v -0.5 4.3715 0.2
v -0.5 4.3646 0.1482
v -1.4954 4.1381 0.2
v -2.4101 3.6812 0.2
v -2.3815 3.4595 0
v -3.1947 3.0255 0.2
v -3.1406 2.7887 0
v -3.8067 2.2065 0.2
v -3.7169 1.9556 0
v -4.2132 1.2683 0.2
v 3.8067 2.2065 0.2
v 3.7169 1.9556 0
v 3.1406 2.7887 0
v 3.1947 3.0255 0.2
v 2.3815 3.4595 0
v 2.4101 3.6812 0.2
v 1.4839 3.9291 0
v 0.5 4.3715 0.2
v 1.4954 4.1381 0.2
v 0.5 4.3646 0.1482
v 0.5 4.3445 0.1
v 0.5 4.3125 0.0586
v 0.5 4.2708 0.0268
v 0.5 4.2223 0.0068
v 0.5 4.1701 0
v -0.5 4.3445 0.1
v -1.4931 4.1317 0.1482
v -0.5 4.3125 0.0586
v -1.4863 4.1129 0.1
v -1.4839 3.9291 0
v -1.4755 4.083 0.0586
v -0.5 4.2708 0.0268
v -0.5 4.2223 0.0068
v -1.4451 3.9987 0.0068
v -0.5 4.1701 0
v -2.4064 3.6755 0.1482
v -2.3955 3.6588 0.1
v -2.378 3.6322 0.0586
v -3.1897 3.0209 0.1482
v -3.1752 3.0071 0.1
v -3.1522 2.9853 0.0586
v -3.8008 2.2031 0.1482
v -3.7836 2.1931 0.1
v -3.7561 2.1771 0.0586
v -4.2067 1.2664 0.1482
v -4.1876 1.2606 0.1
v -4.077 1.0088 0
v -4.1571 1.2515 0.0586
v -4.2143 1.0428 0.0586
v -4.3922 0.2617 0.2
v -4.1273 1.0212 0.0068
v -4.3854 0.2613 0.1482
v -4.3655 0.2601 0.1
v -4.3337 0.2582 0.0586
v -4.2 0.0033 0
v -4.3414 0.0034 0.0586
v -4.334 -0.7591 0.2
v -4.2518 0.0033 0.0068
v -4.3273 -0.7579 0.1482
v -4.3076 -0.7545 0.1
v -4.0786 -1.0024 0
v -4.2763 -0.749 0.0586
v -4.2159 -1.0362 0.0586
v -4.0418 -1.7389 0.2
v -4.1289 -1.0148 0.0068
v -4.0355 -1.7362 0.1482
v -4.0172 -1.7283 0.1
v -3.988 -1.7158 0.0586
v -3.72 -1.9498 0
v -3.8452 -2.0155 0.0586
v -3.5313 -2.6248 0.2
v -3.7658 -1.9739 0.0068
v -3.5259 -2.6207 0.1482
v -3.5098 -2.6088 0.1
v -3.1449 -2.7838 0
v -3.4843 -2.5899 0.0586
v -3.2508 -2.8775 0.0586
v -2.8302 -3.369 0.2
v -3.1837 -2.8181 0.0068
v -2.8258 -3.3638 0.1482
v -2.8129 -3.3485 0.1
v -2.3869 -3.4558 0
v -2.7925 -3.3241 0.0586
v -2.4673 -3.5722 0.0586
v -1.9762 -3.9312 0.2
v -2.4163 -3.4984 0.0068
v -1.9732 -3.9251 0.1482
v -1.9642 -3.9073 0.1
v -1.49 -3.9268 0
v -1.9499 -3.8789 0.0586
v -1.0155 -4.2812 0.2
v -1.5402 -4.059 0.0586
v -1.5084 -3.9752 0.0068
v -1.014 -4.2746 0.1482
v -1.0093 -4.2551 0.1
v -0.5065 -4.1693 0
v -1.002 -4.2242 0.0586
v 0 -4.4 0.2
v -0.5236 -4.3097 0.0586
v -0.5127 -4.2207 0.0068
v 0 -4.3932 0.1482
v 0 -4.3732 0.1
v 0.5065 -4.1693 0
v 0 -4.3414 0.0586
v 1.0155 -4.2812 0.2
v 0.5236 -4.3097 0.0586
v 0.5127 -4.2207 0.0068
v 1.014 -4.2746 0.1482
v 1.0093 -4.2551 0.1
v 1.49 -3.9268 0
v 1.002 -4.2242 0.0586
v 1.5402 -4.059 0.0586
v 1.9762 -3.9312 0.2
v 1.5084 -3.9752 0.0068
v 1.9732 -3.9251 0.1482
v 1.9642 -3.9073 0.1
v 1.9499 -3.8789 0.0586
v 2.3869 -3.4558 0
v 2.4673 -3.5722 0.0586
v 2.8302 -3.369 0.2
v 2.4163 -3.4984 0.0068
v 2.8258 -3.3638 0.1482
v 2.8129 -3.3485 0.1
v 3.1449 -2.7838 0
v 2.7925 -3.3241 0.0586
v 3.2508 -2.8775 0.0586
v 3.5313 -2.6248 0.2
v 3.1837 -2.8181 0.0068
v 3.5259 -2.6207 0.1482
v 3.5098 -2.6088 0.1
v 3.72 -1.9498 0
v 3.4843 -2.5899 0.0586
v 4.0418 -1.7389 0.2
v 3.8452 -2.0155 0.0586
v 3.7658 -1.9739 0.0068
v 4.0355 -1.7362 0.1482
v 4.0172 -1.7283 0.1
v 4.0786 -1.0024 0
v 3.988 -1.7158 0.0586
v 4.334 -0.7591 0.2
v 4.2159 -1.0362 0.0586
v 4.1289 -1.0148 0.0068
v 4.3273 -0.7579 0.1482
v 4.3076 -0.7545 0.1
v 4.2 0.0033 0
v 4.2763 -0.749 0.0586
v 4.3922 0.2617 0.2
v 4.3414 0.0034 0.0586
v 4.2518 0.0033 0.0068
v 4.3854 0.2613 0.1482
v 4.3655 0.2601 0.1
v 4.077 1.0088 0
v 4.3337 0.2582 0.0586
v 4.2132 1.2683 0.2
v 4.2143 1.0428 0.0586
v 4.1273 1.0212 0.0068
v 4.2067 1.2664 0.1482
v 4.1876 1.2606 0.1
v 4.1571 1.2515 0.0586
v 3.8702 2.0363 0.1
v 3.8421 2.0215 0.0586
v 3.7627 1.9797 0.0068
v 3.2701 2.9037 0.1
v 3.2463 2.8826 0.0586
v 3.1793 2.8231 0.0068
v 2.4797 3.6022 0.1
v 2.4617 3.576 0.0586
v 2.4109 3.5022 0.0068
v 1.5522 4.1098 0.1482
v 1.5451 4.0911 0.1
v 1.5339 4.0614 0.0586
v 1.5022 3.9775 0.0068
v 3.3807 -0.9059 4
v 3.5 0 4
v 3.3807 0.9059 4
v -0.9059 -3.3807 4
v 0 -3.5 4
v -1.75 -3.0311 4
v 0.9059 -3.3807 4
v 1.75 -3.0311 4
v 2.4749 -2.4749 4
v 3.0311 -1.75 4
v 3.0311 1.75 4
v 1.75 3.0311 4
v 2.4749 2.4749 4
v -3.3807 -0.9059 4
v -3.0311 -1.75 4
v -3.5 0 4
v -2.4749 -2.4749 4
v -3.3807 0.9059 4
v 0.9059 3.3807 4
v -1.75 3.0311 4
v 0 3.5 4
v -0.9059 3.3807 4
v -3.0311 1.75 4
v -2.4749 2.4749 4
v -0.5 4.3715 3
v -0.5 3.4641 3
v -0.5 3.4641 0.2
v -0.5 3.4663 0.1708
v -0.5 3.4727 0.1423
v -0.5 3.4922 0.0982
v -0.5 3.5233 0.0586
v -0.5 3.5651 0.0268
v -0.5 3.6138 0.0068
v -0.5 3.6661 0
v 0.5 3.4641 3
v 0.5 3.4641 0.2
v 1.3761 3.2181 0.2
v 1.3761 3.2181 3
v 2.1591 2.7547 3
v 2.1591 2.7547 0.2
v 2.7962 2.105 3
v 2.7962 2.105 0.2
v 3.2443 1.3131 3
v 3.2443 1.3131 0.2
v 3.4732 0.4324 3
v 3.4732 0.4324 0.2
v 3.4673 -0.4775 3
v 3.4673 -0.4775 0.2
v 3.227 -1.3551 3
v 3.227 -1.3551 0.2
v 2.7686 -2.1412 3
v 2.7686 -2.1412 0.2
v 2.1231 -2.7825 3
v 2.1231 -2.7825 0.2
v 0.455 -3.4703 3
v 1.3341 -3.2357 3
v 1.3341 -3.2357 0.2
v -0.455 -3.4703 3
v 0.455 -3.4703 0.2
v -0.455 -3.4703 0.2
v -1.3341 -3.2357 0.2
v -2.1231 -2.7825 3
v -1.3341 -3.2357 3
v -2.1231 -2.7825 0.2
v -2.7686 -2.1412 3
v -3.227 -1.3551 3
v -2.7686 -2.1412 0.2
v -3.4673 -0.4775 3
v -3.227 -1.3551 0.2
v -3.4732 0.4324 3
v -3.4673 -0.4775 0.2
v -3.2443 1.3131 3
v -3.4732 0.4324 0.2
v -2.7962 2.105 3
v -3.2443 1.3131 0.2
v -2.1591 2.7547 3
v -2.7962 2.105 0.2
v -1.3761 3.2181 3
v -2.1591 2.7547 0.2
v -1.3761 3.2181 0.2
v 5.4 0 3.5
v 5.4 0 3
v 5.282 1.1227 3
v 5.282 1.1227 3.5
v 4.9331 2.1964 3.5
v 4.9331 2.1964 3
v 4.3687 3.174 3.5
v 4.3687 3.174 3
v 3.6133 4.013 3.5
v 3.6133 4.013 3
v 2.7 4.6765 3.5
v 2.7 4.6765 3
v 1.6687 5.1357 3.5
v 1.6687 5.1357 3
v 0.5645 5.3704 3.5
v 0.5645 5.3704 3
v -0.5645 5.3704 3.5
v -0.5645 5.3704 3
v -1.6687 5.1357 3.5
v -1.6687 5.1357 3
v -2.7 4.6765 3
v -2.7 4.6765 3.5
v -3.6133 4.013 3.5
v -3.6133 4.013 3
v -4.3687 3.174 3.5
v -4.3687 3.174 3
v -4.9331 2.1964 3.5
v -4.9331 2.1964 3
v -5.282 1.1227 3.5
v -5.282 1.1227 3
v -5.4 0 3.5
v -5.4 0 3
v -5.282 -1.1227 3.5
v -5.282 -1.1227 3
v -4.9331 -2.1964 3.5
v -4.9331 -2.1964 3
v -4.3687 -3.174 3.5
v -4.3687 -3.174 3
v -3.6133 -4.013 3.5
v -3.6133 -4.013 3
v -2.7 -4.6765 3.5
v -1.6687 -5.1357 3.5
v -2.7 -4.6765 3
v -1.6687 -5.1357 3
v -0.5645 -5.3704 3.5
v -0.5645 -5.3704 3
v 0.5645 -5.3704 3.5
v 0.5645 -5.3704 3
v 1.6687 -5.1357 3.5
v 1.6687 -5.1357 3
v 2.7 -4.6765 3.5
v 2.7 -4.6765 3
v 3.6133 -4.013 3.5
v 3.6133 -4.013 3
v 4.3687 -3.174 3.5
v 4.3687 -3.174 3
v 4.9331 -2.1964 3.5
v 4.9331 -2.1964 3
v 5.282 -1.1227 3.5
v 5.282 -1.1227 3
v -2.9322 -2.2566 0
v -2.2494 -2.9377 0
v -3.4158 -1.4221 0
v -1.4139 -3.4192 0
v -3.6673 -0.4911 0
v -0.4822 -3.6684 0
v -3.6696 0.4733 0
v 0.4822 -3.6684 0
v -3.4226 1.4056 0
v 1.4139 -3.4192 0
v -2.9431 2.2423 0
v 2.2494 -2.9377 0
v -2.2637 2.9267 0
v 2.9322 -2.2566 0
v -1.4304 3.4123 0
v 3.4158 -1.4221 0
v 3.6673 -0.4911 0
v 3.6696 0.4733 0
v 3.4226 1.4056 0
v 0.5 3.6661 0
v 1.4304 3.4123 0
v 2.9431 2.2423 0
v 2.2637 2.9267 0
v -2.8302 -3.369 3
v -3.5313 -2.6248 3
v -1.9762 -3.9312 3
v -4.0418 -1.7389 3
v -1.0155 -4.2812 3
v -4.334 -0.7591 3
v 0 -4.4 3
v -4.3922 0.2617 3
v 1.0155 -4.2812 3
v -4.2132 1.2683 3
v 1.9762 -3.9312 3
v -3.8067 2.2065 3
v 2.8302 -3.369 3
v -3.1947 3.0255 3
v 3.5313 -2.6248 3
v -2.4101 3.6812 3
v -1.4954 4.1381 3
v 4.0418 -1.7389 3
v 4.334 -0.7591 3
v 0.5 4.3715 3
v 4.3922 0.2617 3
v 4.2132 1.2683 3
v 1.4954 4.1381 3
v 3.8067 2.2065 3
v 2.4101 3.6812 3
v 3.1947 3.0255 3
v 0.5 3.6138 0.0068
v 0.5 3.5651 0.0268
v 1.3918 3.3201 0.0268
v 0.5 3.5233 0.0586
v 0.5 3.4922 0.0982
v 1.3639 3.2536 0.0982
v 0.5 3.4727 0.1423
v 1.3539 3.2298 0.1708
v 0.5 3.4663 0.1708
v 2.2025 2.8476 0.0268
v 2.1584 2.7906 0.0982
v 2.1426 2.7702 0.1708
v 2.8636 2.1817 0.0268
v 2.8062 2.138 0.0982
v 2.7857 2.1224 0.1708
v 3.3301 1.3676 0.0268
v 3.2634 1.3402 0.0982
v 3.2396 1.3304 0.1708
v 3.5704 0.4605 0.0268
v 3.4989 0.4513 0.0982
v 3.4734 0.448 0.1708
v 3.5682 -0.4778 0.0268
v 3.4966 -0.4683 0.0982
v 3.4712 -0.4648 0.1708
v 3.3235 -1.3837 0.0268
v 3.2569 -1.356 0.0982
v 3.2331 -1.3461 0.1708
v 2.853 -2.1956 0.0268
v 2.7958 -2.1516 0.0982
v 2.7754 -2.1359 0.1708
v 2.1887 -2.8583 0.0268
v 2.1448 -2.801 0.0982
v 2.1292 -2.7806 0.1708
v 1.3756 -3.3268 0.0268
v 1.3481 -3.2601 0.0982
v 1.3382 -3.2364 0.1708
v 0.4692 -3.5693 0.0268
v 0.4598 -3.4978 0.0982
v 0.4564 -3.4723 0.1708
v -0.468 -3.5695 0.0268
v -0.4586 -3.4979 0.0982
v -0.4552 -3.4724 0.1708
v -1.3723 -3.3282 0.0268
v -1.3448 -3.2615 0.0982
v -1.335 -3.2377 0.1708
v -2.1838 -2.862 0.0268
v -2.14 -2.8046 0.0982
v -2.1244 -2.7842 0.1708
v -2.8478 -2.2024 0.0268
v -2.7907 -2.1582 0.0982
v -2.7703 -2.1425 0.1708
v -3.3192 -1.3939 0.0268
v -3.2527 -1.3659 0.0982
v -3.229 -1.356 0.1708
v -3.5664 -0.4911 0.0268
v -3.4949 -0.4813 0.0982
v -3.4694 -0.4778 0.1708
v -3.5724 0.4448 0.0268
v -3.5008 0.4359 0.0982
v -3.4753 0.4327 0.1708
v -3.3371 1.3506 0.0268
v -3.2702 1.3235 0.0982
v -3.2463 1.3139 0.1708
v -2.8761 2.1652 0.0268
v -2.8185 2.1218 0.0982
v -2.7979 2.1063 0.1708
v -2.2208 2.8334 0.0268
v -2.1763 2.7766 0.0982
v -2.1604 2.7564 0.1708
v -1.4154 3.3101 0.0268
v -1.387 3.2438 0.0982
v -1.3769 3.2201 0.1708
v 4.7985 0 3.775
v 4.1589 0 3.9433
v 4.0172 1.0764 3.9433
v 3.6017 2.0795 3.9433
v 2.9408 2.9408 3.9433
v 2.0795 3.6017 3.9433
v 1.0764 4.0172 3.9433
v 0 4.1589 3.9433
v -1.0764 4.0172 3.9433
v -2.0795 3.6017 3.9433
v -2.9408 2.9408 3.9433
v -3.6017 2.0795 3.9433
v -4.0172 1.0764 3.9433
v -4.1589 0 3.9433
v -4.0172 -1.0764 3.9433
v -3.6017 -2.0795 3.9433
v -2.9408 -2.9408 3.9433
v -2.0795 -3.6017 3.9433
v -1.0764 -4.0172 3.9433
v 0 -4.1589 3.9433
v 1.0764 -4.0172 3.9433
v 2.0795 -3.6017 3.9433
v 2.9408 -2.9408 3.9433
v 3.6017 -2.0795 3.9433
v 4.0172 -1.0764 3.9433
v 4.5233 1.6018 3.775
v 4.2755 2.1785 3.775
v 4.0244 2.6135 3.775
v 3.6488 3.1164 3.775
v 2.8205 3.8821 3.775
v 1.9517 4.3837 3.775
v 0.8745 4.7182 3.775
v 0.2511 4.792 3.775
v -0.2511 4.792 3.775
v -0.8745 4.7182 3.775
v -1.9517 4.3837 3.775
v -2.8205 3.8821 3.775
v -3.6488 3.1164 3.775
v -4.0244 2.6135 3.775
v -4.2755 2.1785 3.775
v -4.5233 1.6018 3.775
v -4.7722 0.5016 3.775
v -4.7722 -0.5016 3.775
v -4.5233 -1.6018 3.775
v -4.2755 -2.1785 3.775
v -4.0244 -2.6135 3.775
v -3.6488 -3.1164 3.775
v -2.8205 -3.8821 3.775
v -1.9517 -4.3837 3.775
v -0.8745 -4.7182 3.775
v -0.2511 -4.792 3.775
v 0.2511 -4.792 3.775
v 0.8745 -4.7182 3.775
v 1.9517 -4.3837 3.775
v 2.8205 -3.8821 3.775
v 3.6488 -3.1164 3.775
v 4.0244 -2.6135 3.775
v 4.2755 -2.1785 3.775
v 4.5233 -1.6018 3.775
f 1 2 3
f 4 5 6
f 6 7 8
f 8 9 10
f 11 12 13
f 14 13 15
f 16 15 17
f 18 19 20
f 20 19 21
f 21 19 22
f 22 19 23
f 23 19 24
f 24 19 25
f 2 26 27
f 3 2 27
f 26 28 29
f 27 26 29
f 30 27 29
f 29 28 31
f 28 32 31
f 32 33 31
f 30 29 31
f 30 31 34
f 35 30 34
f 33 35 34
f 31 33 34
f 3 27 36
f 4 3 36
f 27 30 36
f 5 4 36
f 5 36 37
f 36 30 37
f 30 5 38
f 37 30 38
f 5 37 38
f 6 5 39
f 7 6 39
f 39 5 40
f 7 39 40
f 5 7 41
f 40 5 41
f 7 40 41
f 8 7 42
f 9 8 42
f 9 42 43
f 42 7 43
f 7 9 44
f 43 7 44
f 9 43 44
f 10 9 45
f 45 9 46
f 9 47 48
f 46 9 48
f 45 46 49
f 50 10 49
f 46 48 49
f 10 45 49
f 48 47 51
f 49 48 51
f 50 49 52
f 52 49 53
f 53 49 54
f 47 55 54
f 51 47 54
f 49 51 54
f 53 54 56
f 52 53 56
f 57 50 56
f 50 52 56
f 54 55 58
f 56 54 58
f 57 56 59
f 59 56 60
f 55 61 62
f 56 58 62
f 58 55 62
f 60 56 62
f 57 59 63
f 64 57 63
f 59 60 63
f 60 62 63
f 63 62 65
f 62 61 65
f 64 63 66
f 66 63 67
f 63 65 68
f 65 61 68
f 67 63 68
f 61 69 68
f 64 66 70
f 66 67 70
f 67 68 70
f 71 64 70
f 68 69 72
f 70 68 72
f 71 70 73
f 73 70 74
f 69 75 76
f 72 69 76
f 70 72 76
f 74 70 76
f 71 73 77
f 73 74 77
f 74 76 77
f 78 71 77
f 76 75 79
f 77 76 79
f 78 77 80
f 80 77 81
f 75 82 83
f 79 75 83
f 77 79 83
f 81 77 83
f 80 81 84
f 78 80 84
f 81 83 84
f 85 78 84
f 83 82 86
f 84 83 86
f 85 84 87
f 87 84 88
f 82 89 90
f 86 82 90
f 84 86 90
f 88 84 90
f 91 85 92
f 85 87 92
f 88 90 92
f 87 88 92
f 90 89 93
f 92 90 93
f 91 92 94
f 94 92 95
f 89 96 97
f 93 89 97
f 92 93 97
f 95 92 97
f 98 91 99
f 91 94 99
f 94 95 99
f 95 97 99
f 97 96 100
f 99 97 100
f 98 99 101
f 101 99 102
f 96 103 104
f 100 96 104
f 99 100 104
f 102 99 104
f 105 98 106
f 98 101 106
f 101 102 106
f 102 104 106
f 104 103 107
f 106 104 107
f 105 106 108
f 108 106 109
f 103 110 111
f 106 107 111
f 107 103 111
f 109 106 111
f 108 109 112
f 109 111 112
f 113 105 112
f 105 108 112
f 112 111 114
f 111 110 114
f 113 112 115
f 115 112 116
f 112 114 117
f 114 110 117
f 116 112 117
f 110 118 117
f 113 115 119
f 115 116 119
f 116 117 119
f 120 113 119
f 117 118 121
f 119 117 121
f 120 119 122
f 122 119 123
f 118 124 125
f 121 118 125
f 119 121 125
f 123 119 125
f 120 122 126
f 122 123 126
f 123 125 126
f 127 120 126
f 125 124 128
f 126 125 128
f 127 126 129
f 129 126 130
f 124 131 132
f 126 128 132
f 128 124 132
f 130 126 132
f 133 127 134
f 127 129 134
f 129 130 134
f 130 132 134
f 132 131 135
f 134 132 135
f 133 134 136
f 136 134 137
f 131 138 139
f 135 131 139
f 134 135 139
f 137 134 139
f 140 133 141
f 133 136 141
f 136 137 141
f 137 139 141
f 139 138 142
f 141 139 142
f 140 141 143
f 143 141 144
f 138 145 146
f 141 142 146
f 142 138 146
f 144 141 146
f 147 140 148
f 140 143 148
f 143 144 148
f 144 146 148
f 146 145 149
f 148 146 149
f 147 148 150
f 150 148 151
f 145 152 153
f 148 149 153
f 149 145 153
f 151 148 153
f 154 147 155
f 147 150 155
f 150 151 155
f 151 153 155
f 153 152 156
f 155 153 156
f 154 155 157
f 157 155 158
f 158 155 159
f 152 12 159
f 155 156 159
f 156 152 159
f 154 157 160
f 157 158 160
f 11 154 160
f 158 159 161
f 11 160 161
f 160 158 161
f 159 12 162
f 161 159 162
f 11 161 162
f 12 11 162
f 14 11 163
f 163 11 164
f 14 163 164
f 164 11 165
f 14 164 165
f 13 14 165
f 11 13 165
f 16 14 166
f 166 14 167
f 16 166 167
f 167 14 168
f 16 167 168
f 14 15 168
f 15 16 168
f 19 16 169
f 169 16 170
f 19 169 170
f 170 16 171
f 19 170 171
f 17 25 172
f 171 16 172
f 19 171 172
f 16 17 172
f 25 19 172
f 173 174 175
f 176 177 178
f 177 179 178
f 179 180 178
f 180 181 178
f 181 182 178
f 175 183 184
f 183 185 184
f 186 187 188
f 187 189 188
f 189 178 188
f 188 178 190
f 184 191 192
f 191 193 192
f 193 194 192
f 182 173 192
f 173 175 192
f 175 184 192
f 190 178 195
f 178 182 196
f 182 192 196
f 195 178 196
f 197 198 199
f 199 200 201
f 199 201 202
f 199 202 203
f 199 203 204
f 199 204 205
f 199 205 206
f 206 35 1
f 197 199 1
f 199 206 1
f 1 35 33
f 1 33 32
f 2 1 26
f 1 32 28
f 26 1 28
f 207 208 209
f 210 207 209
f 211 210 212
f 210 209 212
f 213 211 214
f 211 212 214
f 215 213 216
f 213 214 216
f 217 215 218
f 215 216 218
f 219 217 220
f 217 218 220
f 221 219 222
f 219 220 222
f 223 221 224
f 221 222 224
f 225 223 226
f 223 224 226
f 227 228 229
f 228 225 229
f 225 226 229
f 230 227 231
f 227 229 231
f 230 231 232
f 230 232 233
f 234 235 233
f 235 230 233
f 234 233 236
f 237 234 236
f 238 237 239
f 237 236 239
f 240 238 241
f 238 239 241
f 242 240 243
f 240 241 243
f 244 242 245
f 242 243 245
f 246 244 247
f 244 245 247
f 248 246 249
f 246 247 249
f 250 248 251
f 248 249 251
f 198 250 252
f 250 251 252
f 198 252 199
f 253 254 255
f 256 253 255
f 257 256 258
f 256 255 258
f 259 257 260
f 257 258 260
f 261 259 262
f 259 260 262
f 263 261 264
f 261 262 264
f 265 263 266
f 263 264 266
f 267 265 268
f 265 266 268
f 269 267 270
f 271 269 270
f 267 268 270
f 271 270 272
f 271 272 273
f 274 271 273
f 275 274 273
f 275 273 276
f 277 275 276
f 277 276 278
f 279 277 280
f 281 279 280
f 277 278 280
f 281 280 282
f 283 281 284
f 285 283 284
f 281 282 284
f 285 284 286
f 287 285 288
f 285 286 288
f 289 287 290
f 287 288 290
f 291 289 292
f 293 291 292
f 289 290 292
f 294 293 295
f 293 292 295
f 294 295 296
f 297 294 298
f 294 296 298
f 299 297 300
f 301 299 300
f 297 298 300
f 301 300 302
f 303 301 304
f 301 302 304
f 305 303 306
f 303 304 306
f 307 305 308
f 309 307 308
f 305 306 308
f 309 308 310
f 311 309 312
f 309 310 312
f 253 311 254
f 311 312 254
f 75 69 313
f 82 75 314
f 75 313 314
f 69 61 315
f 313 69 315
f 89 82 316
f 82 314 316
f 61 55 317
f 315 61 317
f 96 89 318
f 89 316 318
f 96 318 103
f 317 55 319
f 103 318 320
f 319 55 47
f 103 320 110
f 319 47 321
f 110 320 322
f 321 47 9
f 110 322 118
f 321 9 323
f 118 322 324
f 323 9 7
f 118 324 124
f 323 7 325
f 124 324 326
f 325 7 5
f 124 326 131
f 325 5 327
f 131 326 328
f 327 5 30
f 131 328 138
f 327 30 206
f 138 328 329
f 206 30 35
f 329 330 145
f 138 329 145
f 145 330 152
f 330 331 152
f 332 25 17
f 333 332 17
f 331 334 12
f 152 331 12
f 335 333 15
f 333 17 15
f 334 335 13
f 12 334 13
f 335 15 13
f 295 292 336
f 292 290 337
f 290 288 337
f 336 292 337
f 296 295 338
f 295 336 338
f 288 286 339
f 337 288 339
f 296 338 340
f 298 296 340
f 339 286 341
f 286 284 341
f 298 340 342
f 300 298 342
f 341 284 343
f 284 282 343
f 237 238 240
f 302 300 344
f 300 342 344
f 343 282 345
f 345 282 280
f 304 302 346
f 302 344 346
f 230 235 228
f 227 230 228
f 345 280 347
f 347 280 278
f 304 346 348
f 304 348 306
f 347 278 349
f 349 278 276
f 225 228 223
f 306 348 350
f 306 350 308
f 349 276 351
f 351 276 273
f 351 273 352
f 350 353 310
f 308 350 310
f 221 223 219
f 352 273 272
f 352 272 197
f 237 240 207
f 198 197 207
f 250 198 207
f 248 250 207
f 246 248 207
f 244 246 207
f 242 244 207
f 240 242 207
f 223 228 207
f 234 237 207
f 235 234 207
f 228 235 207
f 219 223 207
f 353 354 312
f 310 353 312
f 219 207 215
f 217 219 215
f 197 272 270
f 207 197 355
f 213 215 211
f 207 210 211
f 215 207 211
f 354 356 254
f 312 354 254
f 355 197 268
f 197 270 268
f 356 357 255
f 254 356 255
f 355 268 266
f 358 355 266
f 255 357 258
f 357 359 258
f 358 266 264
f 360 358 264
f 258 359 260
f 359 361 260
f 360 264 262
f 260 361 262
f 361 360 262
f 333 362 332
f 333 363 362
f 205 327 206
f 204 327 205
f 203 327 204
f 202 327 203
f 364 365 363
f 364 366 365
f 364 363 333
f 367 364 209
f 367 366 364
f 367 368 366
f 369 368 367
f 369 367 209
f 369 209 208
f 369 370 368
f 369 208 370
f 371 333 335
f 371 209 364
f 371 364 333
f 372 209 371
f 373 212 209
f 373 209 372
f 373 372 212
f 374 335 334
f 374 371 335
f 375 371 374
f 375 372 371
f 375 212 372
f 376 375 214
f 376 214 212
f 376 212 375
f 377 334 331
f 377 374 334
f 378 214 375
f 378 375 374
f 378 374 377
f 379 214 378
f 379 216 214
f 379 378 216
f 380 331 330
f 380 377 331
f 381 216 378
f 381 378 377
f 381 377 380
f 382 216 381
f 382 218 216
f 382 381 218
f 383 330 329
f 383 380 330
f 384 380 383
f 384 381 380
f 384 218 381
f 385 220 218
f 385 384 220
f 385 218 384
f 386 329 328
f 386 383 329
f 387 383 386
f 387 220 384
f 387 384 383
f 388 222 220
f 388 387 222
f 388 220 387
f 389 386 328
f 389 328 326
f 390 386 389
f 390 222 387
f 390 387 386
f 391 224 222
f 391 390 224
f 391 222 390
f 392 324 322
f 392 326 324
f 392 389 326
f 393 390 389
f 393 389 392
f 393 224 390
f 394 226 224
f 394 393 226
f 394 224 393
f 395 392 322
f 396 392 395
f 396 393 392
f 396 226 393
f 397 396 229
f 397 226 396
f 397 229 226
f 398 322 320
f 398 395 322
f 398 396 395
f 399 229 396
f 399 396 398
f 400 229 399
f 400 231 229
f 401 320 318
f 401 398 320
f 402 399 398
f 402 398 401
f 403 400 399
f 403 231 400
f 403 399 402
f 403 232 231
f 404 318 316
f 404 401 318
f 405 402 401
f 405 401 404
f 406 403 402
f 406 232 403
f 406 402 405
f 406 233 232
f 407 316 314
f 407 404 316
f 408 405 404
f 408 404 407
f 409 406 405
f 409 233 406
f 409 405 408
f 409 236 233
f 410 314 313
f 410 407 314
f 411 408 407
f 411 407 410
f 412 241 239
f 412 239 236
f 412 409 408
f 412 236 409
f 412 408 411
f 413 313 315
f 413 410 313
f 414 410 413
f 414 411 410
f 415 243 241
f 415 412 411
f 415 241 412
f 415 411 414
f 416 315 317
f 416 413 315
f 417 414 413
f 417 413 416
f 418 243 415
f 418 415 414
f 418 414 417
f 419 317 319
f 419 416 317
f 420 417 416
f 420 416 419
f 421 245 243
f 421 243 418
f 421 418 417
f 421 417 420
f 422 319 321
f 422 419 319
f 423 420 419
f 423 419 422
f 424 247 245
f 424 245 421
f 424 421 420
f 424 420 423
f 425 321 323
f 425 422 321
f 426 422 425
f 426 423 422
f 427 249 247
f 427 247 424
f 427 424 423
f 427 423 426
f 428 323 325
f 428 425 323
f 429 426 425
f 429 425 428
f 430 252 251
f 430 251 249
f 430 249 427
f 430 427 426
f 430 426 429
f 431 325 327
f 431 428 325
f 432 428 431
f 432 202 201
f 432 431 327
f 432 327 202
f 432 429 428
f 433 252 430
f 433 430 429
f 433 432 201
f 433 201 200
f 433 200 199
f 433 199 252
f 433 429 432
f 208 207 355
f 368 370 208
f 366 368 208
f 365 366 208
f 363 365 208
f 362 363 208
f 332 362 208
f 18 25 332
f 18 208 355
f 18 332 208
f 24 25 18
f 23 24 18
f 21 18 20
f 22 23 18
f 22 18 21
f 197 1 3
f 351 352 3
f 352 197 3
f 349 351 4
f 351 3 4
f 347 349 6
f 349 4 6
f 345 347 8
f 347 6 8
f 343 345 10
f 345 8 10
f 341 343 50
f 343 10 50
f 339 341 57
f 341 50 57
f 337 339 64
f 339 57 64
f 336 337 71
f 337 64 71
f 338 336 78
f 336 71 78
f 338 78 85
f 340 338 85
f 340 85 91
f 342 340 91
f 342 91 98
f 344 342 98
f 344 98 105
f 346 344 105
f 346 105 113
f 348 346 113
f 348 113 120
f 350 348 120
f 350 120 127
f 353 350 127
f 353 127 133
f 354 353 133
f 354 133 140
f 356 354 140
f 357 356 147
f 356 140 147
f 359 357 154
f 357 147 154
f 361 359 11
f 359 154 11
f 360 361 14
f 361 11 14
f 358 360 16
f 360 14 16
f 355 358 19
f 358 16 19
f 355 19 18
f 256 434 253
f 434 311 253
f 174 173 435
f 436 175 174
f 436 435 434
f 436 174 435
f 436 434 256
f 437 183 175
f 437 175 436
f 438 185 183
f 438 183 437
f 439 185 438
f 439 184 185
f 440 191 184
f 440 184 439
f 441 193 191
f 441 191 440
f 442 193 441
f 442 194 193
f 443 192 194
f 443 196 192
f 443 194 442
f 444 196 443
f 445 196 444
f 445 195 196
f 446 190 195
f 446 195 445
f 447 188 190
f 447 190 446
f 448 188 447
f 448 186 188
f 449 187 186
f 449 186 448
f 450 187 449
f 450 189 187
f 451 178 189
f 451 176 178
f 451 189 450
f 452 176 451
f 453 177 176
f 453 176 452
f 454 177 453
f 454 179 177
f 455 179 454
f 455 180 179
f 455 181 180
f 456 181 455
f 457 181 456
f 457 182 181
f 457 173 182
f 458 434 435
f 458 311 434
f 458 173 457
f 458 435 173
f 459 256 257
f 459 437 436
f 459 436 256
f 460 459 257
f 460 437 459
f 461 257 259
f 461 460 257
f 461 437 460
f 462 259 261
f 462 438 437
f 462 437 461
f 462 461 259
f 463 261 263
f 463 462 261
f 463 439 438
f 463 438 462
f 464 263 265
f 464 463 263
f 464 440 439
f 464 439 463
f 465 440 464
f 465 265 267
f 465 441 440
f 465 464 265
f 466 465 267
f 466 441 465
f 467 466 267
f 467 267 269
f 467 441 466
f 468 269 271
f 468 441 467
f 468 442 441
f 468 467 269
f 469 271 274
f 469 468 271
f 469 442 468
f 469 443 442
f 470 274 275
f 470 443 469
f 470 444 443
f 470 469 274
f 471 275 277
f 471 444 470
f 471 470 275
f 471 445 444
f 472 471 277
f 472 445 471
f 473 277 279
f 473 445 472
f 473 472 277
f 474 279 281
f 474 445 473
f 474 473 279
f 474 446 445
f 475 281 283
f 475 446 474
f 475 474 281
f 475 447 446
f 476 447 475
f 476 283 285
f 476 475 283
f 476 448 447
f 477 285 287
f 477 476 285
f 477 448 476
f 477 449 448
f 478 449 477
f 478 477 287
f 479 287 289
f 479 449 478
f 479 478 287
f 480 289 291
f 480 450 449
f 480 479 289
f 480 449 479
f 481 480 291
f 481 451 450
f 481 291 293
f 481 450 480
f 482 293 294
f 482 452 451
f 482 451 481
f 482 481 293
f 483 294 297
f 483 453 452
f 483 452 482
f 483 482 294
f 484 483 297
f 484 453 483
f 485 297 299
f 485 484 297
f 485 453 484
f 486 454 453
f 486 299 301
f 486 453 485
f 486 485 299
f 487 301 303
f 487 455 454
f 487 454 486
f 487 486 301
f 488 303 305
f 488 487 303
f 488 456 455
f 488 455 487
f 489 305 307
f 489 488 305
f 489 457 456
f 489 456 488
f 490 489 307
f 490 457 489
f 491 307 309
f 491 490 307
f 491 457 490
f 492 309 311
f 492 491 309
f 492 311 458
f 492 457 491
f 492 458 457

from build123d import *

# Parameters (mm, degrees)
BOX_W        = 1
BOX_H        = 6
BOX_DEPTH    = 6
SKETCH001_R  = 3.5
POCKET_DEPTH = 3
FILLET_R     = 0.2
FILLET001_R  = 0.2


with BuildPart() as cube:
    # Box → Box (new body)
    with BuildSketch(Plane(origin=(-0.5, 0, -3), x_dir=(1, 0, 0), z_dir=(0, 0, 1))):
        with Locations((0.5, 3)):
            Rectangle(BOX_W, BOX_H)
    extrude(amount=BOX_DEPTH)


with BuildPart() as cut:
    # Sketch → Revolution (revolve)
    with BuildSketch(Plane.XZ):
        with BuildLine():
            Line((5.4, 3.5), (5.4, 3))
            Line((5.4, 3), (4.4, 3))
            Line((4.4, 3), (4.4, 0))
            Line((4.4, 0), (0, 0))
            Line((0, 0), (0, 4))
            Line((0, 4), (3.5, 4))
            ThreePointArc((5.4, 3.5), (4.482344, 3.872908), (3.5, 4))
        make_face()
    revolve(axis=Axis((0, 0, 0), (0, 0, 1)))

    # Sketch001 (on Face4 of Revolution) → Pocket (cut)
    with BuildSketch(Plane(origin=(0, 0, 0), x_dir=(1, 0, 0), z_dir=(0, 0, -1))):
        Circle(SKETCH001_R)
    extrude(amount=-POCKET_DEPTH, mode=Mode.SUBTRACT)

    # Fillet
    fillet_edges = [cut.edges().sort_by_distance(p)[0] for p in [
        (-4.4, 0, 0),
    ]]
    fillet(fillet_edges, radius=FILLET_R)

    # Fillet001
    fillet001_edges = [cut.edges().sort_by_distance(p)[0] for p in [
        (-3.5, 0, 0),
    ]]
    fillet(fillet001_edges, radius=FILLET001_R)

    # Cut: cut Cube
    add(cube.part, mode=Mode.SUBTRACT)


solid = cut.part
